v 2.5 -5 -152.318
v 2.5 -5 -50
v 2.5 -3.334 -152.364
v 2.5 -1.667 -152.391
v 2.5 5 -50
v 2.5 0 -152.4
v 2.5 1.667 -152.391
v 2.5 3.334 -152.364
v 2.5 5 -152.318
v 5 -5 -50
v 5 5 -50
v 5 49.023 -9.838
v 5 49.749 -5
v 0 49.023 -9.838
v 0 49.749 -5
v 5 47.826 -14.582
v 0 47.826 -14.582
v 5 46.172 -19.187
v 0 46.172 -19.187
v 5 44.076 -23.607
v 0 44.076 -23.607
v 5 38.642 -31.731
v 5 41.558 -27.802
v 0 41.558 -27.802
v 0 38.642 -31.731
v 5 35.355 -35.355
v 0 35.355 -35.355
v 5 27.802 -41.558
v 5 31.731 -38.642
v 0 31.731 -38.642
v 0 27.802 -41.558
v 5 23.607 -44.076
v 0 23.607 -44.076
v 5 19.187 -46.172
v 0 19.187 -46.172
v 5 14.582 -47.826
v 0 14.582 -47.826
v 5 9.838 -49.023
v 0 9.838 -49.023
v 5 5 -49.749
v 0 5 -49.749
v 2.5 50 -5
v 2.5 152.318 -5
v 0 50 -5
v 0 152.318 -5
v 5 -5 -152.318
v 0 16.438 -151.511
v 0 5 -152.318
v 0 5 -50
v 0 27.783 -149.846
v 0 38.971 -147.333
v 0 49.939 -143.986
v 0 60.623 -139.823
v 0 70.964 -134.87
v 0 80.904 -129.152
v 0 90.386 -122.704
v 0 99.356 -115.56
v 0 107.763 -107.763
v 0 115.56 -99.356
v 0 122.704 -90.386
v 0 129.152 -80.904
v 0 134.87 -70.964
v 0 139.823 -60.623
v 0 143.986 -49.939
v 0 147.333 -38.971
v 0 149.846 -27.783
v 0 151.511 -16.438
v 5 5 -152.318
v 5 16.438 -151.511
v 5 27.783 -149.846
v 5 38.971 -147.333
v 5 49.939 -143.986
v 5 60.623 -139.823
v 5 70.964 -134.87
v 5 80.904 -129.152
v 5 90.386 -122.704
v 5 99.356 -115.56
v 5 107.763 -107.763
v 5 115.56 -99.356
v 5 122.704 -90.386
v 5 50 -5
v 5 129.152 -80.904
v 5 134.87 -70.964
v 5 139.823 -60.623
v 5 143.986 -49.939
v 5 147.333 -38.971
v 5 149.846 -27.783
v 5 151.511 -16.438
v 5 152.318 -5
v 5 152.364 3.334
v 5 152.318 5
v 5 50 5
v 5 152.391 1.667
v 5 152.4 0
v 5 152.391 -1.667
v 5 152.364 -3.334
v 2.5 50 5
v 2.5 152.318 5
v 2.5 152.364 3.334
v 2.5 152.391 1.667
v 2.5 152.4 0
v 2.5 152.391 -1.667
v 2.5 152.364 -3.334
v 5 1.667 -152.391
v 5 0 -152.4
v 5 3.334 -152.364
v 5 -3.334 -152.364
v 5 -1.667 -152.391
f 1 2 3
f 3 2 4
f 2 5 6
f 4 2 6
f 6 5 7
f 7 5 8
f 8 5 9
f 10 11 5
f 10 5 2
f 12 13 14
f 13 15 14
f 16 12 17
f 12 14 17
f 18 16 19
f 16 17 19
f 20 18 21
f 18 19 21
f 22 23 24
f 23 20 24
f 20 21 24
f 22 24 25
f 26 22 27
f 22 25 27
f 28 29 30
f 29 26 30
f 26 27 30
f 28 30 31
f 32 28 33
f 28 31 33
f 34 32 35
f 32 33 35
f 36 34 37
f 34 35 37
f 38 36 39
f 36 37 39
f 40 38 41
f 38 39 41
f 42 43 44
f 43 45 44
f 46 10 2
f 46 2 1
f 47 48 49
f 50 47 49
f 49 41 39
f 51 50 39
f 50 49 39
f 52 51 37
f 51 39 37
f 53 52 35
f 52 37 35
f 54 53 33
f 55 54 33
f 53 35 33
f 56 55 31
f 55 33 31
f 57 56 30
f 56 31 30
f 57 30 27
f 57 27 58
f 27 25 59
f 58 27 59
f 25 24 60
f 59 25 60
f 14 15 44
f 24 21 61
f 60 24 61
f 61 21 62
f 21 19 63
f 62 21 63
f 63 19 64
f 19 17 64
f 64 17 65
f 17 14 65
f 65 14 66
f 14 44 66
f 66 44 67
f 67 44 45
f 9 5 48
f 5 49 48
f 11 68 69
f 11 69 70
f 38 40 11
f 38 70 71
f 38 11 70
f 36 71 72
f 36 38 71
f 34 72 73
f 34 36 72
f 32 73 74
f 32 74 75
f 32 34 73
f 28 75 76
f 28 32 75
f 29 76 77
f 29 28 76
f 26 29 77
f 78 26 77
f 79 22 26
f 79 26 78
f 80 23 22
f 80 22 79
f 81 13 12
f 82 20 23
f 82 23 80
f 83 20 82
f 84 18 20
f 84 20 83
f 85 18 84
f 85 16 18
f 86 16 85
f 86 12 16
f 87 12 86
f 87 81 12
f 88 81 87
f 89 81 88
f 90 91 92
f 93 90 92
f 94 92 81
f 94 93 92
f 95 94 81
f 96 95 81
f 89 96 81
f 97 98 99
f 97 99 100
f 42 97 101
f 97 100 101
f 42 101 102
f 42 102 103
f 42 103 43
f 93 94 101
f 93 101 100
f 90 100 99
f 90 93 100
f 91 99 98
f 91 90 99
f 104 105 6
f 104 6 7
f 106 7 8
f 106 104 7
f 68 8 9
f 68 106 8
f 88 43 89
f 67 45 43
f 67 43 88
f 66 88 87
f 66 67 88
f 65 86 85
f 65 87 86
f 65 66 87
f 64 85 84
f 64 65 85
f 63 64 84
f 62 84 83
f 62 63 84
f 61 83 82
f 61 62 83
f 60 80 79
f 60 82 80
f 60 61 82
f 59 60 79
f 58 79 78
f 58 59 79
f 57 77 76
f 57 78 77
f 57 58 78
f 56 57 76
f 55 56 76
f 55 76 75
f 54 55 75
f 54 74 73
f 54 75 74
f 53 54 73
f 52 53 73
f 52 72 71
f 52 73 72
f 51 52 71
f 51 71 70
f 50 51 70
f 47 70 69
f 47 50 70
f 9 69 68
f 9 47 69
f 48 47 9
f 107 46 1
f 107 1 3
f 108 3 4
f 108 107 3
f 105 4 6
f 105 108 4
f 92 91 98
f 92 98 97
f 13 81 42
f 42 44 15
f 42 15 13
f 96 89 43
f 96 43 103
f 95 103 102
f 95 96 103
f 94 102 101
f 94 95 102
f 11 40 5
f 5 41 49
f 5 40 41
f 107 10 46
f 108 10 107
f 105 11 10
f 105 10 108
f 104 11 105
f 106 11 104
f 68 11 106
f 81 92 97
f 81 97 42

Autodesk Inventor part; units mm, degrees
ref_plane "YZ Plane" through (0, 0, 0) normal (1, 0, 0) x (0, 1, 0)
ref_plane "XZ Plane" through (0, 0, 0) normal (0, 1, 0) x (-1, 0, 0)
ref_plane "XY Plane" through (0, 0, 0) normal (0, 0, 1) x (1, 0, 0)
sketch "Sketch1" plane through (0, 0, 0) normal (1, 0, 0) x (0, 1, 0)
  line L0 (152.4, 0) -> (152.4, -152.4)
  line L1 (152.4, -152.4) -> (0, -152.4)
  circle A0 centre (0, 0) radius 152.4
  arc A1 (0, -152.4) -> (152.4, 0) centre (0, 0) ccw
  line L2 (152.318, 5) -> (50, 5)
  line L3 (50, -5) -> (50, 5)
  line L4 (152.318, -5) -> (49.7494, -5)
  line L5 (5, -49.7494) -> (5, -152.318)
  line L6 (-5, -50) -> (-5, -152.318)
  line L7 (5, -50) -> (-5, -50)
  arc A2 (50, 0) -> (0, -50) centre (0, 0) ccw
  arc A3 (5, -49.7494) -> (49.7494, -5) centre (0, 0) ccw
  dimension "d7" = 152.4
  dimension "d8" = 50
  dimension "d9" = 50
  dimension "d10" = 147.4
  dimension "d11" = 157.4
  dimension "d12" = 10
  dimension "d13" = 157.4
  dimension "d14" = 147.4
extrude "Extrusion1" add sketch "Sketch1" along normal blind 5 contours A0 L5 A3 L4
sketch "Sketch2" plane through (5, 0, 0) normal (1, 0, 0) x (0, 0, -1)
  line L0 (49.7494, 5) -> (152.318, 5) projected
  line L1 (50, 5) -> (50, -5)
  line L2 (0, 152.4) -> (0, 0)
  line L3 (5, 152.318) -> (5, 49.7494) projected
  line L4 (0, 0) -> (152.4, 0)
  arc A0 (152.4, 0) -> (0, 152.4) centre (0, 0) ccw
  arc A1 (152.318, 5) -> (5, 152.318) centre (0, 0) ccw projected
  line L5 (50, -5) -> (152.318, -5)
  arc A2 (152.318, -5) -> (152.318, 5) centre (0, 0) ccw
  line L6 (-5, 50) -> (5, 50)
  line L7 (5, 50) -> (5, 152.318)
  arc A3 (5, 152.318) -> (-5, 152.318) centre (0, 0) ccw
  line L8 (-5, 152.318) -> (-5, 50)
  arc A4 (49.7494, 5) -> (5, 49.7494) centre (0, 0) ccw
  arc A5 (0, 50) -> (50, 0) centre (0, 0) ccw
  point P0 (0, 152.4)
  dimension "d18" = 10
  dimension "d19" = 152.4
  dimension "d20" = 152.4
  dimension "d23" = 90
  dimension "d25" = 152.4
extrude "Extrusion2" add sketch "Sketch2" against normal blind 2.5 contours L0 A0 L4 L1 | L4 A2 L5 L1 | L6 L2 A0 L3 | L6 L8 A3 L2
